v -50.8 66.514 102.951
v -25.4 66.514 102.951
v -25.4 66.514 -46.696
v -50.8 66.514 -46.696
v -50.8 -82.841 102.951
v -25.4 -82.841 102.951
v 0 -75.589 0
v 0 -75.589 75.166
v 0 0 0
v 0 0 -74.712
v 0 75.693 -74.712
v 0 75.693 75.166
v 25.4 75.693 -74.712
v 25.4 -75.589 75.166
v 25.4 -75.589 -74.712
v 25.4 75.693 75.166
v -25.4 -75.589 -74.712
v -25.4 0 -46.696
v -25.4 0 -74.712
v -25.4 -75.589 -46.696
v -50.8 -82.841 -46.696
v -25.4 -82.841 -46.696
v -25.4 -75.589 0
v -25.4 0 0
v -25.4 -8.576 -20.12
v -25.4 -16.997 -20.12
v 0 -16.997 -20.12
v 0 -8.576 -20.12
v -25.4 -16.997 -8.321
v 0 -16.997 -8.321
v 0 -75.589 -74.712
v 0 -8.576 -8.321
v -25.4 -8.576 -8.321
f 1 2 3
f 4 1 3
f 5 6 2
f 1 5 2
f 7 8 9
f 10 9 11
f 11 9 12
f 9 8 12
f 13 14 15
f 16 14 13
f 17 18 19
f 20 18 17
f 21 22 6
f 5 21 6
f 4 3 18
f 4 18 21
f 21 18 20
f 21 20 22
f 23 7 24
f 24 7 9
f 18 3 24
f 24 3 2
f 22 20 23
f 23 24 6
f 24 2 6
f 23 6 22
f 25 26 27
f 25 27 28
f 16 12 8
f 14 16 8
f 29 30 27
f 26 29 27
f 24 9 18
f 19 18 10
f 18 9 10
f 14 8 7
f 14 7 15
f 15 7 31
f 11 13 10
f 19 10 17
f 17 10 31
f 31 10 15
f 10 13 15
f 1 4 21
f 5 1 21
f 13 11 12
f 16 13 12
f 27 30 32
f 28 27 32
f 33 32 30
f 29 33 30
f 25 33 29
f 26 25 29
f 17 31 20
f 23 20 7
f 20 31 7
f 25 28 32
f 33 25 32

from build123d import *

# Parameters (mm, degrees)
F0_W     = 75.5894184113
F0_H     = 75.1656368375
F0_W_2   = 75.6931006908
F1_DEPTH = 25.4
F2_W     = 58.5926715285
F2_H     = 41.5871664882
F2_W_2   = 8.5760951042
F2_H_2   = 8.3214826882
F2_W_3   = 8.4206517786
F3_DEPTH = 25.4
F4_W     = 91.1564920098
F4_H     = 141.0772651434
F4_H_2   = 8.5697695613
F5_DEPTH = 25.4


with BuildPart() as f1:
    # F0 (on Right) → F1 (new body)
    with BuildSketch(Plane.YZ):
        with Locations((-37.7947092056, 37.5828184187)):
            Rectangle(F0_W, F0_H)
        with Locations((37.8465503454, 37.5828184187)):
            Rectangle(F0_W_2, F0_H)
        Polygon((0, 0), (-75.5894184113, 0), (-75.5894184113, -74.7117847204), (75.6931006908, -74.7117847204), (75.6931006908, 0), align=None)
    extrude(amount=F1_DEPTH)

    # F2 (on face) → F3 (join)
    with BuildSketch(Plane(origin=(0, 0, 0), x_dir=(0, -1, 0), z_dir=(-1, 0, 0))):
        with Locations((46.293082647, -53.9182014763)):
            Rectangle(F2_W, F2_H)
        Polygon((0, -74.7117847204), (16.9967468828, -74.7117847204), (16.9967468828, -33.1246182323), (16.9967468828, -22.4458947778), (0, -22.4458947778), align=None)
        Polygon((16.9967468828, -33.1246182323), (75.5894184113, -33.1246182323), (75.5894184113, -20.1201699674), (16.9967468828, -20.1201699674), (16.9967468828, -22.4458947778), align=None)
        Polygon((16.9967468828, -20.1201699674), (75.5894184113, -20.1201699674), (75.5894184113, 0), (16.9967468828, 0), (16.9967468828, -8.3214826882), align=None)
        Polygon((0, -22.4458947778), (16.9967468828, -22.4458947778), (16.9967468828, -20.1201699674), (8.5760951042, -20.1201699674), (8.5760951042, -8.3214826882), (0, -8.3214826882), align=None)
        with Locations((4.2880475521, -4.1607413441)):
            Rectangle(F2_W_2, F2_H_2)
        with Locations((12.7864209935, -4.1607413441)):
            Rectangle(F2_W_3, F2_H_2)
    extrude(amount=F3_DEPTH)

    # F4 (on face) → F5 (join)
    with BuildSketch(Plane(origin=(-25.4, 0, 0), x_dir=(0, -1, 0), z_dir=(-1, 0, 0))):
        with Locations((-20.9354860708, 23.8422006369)):
            Rectangle(F4_W, F4_H)
        Polygon((24.6427599341, 102.9506027699), (24.6427599341, 94.3808332086), (24.6427599341, -46.6964319348), (82.840628922, -46.6964319348), (82.840628922, 102.9506027699), align=None)
        with Locations((-20.9354860708, 98.6657179892)):
            Rectangle(F4_W, F4_H_2)
    extrude(amount=F5_DEPTH)


solid = f1.part
